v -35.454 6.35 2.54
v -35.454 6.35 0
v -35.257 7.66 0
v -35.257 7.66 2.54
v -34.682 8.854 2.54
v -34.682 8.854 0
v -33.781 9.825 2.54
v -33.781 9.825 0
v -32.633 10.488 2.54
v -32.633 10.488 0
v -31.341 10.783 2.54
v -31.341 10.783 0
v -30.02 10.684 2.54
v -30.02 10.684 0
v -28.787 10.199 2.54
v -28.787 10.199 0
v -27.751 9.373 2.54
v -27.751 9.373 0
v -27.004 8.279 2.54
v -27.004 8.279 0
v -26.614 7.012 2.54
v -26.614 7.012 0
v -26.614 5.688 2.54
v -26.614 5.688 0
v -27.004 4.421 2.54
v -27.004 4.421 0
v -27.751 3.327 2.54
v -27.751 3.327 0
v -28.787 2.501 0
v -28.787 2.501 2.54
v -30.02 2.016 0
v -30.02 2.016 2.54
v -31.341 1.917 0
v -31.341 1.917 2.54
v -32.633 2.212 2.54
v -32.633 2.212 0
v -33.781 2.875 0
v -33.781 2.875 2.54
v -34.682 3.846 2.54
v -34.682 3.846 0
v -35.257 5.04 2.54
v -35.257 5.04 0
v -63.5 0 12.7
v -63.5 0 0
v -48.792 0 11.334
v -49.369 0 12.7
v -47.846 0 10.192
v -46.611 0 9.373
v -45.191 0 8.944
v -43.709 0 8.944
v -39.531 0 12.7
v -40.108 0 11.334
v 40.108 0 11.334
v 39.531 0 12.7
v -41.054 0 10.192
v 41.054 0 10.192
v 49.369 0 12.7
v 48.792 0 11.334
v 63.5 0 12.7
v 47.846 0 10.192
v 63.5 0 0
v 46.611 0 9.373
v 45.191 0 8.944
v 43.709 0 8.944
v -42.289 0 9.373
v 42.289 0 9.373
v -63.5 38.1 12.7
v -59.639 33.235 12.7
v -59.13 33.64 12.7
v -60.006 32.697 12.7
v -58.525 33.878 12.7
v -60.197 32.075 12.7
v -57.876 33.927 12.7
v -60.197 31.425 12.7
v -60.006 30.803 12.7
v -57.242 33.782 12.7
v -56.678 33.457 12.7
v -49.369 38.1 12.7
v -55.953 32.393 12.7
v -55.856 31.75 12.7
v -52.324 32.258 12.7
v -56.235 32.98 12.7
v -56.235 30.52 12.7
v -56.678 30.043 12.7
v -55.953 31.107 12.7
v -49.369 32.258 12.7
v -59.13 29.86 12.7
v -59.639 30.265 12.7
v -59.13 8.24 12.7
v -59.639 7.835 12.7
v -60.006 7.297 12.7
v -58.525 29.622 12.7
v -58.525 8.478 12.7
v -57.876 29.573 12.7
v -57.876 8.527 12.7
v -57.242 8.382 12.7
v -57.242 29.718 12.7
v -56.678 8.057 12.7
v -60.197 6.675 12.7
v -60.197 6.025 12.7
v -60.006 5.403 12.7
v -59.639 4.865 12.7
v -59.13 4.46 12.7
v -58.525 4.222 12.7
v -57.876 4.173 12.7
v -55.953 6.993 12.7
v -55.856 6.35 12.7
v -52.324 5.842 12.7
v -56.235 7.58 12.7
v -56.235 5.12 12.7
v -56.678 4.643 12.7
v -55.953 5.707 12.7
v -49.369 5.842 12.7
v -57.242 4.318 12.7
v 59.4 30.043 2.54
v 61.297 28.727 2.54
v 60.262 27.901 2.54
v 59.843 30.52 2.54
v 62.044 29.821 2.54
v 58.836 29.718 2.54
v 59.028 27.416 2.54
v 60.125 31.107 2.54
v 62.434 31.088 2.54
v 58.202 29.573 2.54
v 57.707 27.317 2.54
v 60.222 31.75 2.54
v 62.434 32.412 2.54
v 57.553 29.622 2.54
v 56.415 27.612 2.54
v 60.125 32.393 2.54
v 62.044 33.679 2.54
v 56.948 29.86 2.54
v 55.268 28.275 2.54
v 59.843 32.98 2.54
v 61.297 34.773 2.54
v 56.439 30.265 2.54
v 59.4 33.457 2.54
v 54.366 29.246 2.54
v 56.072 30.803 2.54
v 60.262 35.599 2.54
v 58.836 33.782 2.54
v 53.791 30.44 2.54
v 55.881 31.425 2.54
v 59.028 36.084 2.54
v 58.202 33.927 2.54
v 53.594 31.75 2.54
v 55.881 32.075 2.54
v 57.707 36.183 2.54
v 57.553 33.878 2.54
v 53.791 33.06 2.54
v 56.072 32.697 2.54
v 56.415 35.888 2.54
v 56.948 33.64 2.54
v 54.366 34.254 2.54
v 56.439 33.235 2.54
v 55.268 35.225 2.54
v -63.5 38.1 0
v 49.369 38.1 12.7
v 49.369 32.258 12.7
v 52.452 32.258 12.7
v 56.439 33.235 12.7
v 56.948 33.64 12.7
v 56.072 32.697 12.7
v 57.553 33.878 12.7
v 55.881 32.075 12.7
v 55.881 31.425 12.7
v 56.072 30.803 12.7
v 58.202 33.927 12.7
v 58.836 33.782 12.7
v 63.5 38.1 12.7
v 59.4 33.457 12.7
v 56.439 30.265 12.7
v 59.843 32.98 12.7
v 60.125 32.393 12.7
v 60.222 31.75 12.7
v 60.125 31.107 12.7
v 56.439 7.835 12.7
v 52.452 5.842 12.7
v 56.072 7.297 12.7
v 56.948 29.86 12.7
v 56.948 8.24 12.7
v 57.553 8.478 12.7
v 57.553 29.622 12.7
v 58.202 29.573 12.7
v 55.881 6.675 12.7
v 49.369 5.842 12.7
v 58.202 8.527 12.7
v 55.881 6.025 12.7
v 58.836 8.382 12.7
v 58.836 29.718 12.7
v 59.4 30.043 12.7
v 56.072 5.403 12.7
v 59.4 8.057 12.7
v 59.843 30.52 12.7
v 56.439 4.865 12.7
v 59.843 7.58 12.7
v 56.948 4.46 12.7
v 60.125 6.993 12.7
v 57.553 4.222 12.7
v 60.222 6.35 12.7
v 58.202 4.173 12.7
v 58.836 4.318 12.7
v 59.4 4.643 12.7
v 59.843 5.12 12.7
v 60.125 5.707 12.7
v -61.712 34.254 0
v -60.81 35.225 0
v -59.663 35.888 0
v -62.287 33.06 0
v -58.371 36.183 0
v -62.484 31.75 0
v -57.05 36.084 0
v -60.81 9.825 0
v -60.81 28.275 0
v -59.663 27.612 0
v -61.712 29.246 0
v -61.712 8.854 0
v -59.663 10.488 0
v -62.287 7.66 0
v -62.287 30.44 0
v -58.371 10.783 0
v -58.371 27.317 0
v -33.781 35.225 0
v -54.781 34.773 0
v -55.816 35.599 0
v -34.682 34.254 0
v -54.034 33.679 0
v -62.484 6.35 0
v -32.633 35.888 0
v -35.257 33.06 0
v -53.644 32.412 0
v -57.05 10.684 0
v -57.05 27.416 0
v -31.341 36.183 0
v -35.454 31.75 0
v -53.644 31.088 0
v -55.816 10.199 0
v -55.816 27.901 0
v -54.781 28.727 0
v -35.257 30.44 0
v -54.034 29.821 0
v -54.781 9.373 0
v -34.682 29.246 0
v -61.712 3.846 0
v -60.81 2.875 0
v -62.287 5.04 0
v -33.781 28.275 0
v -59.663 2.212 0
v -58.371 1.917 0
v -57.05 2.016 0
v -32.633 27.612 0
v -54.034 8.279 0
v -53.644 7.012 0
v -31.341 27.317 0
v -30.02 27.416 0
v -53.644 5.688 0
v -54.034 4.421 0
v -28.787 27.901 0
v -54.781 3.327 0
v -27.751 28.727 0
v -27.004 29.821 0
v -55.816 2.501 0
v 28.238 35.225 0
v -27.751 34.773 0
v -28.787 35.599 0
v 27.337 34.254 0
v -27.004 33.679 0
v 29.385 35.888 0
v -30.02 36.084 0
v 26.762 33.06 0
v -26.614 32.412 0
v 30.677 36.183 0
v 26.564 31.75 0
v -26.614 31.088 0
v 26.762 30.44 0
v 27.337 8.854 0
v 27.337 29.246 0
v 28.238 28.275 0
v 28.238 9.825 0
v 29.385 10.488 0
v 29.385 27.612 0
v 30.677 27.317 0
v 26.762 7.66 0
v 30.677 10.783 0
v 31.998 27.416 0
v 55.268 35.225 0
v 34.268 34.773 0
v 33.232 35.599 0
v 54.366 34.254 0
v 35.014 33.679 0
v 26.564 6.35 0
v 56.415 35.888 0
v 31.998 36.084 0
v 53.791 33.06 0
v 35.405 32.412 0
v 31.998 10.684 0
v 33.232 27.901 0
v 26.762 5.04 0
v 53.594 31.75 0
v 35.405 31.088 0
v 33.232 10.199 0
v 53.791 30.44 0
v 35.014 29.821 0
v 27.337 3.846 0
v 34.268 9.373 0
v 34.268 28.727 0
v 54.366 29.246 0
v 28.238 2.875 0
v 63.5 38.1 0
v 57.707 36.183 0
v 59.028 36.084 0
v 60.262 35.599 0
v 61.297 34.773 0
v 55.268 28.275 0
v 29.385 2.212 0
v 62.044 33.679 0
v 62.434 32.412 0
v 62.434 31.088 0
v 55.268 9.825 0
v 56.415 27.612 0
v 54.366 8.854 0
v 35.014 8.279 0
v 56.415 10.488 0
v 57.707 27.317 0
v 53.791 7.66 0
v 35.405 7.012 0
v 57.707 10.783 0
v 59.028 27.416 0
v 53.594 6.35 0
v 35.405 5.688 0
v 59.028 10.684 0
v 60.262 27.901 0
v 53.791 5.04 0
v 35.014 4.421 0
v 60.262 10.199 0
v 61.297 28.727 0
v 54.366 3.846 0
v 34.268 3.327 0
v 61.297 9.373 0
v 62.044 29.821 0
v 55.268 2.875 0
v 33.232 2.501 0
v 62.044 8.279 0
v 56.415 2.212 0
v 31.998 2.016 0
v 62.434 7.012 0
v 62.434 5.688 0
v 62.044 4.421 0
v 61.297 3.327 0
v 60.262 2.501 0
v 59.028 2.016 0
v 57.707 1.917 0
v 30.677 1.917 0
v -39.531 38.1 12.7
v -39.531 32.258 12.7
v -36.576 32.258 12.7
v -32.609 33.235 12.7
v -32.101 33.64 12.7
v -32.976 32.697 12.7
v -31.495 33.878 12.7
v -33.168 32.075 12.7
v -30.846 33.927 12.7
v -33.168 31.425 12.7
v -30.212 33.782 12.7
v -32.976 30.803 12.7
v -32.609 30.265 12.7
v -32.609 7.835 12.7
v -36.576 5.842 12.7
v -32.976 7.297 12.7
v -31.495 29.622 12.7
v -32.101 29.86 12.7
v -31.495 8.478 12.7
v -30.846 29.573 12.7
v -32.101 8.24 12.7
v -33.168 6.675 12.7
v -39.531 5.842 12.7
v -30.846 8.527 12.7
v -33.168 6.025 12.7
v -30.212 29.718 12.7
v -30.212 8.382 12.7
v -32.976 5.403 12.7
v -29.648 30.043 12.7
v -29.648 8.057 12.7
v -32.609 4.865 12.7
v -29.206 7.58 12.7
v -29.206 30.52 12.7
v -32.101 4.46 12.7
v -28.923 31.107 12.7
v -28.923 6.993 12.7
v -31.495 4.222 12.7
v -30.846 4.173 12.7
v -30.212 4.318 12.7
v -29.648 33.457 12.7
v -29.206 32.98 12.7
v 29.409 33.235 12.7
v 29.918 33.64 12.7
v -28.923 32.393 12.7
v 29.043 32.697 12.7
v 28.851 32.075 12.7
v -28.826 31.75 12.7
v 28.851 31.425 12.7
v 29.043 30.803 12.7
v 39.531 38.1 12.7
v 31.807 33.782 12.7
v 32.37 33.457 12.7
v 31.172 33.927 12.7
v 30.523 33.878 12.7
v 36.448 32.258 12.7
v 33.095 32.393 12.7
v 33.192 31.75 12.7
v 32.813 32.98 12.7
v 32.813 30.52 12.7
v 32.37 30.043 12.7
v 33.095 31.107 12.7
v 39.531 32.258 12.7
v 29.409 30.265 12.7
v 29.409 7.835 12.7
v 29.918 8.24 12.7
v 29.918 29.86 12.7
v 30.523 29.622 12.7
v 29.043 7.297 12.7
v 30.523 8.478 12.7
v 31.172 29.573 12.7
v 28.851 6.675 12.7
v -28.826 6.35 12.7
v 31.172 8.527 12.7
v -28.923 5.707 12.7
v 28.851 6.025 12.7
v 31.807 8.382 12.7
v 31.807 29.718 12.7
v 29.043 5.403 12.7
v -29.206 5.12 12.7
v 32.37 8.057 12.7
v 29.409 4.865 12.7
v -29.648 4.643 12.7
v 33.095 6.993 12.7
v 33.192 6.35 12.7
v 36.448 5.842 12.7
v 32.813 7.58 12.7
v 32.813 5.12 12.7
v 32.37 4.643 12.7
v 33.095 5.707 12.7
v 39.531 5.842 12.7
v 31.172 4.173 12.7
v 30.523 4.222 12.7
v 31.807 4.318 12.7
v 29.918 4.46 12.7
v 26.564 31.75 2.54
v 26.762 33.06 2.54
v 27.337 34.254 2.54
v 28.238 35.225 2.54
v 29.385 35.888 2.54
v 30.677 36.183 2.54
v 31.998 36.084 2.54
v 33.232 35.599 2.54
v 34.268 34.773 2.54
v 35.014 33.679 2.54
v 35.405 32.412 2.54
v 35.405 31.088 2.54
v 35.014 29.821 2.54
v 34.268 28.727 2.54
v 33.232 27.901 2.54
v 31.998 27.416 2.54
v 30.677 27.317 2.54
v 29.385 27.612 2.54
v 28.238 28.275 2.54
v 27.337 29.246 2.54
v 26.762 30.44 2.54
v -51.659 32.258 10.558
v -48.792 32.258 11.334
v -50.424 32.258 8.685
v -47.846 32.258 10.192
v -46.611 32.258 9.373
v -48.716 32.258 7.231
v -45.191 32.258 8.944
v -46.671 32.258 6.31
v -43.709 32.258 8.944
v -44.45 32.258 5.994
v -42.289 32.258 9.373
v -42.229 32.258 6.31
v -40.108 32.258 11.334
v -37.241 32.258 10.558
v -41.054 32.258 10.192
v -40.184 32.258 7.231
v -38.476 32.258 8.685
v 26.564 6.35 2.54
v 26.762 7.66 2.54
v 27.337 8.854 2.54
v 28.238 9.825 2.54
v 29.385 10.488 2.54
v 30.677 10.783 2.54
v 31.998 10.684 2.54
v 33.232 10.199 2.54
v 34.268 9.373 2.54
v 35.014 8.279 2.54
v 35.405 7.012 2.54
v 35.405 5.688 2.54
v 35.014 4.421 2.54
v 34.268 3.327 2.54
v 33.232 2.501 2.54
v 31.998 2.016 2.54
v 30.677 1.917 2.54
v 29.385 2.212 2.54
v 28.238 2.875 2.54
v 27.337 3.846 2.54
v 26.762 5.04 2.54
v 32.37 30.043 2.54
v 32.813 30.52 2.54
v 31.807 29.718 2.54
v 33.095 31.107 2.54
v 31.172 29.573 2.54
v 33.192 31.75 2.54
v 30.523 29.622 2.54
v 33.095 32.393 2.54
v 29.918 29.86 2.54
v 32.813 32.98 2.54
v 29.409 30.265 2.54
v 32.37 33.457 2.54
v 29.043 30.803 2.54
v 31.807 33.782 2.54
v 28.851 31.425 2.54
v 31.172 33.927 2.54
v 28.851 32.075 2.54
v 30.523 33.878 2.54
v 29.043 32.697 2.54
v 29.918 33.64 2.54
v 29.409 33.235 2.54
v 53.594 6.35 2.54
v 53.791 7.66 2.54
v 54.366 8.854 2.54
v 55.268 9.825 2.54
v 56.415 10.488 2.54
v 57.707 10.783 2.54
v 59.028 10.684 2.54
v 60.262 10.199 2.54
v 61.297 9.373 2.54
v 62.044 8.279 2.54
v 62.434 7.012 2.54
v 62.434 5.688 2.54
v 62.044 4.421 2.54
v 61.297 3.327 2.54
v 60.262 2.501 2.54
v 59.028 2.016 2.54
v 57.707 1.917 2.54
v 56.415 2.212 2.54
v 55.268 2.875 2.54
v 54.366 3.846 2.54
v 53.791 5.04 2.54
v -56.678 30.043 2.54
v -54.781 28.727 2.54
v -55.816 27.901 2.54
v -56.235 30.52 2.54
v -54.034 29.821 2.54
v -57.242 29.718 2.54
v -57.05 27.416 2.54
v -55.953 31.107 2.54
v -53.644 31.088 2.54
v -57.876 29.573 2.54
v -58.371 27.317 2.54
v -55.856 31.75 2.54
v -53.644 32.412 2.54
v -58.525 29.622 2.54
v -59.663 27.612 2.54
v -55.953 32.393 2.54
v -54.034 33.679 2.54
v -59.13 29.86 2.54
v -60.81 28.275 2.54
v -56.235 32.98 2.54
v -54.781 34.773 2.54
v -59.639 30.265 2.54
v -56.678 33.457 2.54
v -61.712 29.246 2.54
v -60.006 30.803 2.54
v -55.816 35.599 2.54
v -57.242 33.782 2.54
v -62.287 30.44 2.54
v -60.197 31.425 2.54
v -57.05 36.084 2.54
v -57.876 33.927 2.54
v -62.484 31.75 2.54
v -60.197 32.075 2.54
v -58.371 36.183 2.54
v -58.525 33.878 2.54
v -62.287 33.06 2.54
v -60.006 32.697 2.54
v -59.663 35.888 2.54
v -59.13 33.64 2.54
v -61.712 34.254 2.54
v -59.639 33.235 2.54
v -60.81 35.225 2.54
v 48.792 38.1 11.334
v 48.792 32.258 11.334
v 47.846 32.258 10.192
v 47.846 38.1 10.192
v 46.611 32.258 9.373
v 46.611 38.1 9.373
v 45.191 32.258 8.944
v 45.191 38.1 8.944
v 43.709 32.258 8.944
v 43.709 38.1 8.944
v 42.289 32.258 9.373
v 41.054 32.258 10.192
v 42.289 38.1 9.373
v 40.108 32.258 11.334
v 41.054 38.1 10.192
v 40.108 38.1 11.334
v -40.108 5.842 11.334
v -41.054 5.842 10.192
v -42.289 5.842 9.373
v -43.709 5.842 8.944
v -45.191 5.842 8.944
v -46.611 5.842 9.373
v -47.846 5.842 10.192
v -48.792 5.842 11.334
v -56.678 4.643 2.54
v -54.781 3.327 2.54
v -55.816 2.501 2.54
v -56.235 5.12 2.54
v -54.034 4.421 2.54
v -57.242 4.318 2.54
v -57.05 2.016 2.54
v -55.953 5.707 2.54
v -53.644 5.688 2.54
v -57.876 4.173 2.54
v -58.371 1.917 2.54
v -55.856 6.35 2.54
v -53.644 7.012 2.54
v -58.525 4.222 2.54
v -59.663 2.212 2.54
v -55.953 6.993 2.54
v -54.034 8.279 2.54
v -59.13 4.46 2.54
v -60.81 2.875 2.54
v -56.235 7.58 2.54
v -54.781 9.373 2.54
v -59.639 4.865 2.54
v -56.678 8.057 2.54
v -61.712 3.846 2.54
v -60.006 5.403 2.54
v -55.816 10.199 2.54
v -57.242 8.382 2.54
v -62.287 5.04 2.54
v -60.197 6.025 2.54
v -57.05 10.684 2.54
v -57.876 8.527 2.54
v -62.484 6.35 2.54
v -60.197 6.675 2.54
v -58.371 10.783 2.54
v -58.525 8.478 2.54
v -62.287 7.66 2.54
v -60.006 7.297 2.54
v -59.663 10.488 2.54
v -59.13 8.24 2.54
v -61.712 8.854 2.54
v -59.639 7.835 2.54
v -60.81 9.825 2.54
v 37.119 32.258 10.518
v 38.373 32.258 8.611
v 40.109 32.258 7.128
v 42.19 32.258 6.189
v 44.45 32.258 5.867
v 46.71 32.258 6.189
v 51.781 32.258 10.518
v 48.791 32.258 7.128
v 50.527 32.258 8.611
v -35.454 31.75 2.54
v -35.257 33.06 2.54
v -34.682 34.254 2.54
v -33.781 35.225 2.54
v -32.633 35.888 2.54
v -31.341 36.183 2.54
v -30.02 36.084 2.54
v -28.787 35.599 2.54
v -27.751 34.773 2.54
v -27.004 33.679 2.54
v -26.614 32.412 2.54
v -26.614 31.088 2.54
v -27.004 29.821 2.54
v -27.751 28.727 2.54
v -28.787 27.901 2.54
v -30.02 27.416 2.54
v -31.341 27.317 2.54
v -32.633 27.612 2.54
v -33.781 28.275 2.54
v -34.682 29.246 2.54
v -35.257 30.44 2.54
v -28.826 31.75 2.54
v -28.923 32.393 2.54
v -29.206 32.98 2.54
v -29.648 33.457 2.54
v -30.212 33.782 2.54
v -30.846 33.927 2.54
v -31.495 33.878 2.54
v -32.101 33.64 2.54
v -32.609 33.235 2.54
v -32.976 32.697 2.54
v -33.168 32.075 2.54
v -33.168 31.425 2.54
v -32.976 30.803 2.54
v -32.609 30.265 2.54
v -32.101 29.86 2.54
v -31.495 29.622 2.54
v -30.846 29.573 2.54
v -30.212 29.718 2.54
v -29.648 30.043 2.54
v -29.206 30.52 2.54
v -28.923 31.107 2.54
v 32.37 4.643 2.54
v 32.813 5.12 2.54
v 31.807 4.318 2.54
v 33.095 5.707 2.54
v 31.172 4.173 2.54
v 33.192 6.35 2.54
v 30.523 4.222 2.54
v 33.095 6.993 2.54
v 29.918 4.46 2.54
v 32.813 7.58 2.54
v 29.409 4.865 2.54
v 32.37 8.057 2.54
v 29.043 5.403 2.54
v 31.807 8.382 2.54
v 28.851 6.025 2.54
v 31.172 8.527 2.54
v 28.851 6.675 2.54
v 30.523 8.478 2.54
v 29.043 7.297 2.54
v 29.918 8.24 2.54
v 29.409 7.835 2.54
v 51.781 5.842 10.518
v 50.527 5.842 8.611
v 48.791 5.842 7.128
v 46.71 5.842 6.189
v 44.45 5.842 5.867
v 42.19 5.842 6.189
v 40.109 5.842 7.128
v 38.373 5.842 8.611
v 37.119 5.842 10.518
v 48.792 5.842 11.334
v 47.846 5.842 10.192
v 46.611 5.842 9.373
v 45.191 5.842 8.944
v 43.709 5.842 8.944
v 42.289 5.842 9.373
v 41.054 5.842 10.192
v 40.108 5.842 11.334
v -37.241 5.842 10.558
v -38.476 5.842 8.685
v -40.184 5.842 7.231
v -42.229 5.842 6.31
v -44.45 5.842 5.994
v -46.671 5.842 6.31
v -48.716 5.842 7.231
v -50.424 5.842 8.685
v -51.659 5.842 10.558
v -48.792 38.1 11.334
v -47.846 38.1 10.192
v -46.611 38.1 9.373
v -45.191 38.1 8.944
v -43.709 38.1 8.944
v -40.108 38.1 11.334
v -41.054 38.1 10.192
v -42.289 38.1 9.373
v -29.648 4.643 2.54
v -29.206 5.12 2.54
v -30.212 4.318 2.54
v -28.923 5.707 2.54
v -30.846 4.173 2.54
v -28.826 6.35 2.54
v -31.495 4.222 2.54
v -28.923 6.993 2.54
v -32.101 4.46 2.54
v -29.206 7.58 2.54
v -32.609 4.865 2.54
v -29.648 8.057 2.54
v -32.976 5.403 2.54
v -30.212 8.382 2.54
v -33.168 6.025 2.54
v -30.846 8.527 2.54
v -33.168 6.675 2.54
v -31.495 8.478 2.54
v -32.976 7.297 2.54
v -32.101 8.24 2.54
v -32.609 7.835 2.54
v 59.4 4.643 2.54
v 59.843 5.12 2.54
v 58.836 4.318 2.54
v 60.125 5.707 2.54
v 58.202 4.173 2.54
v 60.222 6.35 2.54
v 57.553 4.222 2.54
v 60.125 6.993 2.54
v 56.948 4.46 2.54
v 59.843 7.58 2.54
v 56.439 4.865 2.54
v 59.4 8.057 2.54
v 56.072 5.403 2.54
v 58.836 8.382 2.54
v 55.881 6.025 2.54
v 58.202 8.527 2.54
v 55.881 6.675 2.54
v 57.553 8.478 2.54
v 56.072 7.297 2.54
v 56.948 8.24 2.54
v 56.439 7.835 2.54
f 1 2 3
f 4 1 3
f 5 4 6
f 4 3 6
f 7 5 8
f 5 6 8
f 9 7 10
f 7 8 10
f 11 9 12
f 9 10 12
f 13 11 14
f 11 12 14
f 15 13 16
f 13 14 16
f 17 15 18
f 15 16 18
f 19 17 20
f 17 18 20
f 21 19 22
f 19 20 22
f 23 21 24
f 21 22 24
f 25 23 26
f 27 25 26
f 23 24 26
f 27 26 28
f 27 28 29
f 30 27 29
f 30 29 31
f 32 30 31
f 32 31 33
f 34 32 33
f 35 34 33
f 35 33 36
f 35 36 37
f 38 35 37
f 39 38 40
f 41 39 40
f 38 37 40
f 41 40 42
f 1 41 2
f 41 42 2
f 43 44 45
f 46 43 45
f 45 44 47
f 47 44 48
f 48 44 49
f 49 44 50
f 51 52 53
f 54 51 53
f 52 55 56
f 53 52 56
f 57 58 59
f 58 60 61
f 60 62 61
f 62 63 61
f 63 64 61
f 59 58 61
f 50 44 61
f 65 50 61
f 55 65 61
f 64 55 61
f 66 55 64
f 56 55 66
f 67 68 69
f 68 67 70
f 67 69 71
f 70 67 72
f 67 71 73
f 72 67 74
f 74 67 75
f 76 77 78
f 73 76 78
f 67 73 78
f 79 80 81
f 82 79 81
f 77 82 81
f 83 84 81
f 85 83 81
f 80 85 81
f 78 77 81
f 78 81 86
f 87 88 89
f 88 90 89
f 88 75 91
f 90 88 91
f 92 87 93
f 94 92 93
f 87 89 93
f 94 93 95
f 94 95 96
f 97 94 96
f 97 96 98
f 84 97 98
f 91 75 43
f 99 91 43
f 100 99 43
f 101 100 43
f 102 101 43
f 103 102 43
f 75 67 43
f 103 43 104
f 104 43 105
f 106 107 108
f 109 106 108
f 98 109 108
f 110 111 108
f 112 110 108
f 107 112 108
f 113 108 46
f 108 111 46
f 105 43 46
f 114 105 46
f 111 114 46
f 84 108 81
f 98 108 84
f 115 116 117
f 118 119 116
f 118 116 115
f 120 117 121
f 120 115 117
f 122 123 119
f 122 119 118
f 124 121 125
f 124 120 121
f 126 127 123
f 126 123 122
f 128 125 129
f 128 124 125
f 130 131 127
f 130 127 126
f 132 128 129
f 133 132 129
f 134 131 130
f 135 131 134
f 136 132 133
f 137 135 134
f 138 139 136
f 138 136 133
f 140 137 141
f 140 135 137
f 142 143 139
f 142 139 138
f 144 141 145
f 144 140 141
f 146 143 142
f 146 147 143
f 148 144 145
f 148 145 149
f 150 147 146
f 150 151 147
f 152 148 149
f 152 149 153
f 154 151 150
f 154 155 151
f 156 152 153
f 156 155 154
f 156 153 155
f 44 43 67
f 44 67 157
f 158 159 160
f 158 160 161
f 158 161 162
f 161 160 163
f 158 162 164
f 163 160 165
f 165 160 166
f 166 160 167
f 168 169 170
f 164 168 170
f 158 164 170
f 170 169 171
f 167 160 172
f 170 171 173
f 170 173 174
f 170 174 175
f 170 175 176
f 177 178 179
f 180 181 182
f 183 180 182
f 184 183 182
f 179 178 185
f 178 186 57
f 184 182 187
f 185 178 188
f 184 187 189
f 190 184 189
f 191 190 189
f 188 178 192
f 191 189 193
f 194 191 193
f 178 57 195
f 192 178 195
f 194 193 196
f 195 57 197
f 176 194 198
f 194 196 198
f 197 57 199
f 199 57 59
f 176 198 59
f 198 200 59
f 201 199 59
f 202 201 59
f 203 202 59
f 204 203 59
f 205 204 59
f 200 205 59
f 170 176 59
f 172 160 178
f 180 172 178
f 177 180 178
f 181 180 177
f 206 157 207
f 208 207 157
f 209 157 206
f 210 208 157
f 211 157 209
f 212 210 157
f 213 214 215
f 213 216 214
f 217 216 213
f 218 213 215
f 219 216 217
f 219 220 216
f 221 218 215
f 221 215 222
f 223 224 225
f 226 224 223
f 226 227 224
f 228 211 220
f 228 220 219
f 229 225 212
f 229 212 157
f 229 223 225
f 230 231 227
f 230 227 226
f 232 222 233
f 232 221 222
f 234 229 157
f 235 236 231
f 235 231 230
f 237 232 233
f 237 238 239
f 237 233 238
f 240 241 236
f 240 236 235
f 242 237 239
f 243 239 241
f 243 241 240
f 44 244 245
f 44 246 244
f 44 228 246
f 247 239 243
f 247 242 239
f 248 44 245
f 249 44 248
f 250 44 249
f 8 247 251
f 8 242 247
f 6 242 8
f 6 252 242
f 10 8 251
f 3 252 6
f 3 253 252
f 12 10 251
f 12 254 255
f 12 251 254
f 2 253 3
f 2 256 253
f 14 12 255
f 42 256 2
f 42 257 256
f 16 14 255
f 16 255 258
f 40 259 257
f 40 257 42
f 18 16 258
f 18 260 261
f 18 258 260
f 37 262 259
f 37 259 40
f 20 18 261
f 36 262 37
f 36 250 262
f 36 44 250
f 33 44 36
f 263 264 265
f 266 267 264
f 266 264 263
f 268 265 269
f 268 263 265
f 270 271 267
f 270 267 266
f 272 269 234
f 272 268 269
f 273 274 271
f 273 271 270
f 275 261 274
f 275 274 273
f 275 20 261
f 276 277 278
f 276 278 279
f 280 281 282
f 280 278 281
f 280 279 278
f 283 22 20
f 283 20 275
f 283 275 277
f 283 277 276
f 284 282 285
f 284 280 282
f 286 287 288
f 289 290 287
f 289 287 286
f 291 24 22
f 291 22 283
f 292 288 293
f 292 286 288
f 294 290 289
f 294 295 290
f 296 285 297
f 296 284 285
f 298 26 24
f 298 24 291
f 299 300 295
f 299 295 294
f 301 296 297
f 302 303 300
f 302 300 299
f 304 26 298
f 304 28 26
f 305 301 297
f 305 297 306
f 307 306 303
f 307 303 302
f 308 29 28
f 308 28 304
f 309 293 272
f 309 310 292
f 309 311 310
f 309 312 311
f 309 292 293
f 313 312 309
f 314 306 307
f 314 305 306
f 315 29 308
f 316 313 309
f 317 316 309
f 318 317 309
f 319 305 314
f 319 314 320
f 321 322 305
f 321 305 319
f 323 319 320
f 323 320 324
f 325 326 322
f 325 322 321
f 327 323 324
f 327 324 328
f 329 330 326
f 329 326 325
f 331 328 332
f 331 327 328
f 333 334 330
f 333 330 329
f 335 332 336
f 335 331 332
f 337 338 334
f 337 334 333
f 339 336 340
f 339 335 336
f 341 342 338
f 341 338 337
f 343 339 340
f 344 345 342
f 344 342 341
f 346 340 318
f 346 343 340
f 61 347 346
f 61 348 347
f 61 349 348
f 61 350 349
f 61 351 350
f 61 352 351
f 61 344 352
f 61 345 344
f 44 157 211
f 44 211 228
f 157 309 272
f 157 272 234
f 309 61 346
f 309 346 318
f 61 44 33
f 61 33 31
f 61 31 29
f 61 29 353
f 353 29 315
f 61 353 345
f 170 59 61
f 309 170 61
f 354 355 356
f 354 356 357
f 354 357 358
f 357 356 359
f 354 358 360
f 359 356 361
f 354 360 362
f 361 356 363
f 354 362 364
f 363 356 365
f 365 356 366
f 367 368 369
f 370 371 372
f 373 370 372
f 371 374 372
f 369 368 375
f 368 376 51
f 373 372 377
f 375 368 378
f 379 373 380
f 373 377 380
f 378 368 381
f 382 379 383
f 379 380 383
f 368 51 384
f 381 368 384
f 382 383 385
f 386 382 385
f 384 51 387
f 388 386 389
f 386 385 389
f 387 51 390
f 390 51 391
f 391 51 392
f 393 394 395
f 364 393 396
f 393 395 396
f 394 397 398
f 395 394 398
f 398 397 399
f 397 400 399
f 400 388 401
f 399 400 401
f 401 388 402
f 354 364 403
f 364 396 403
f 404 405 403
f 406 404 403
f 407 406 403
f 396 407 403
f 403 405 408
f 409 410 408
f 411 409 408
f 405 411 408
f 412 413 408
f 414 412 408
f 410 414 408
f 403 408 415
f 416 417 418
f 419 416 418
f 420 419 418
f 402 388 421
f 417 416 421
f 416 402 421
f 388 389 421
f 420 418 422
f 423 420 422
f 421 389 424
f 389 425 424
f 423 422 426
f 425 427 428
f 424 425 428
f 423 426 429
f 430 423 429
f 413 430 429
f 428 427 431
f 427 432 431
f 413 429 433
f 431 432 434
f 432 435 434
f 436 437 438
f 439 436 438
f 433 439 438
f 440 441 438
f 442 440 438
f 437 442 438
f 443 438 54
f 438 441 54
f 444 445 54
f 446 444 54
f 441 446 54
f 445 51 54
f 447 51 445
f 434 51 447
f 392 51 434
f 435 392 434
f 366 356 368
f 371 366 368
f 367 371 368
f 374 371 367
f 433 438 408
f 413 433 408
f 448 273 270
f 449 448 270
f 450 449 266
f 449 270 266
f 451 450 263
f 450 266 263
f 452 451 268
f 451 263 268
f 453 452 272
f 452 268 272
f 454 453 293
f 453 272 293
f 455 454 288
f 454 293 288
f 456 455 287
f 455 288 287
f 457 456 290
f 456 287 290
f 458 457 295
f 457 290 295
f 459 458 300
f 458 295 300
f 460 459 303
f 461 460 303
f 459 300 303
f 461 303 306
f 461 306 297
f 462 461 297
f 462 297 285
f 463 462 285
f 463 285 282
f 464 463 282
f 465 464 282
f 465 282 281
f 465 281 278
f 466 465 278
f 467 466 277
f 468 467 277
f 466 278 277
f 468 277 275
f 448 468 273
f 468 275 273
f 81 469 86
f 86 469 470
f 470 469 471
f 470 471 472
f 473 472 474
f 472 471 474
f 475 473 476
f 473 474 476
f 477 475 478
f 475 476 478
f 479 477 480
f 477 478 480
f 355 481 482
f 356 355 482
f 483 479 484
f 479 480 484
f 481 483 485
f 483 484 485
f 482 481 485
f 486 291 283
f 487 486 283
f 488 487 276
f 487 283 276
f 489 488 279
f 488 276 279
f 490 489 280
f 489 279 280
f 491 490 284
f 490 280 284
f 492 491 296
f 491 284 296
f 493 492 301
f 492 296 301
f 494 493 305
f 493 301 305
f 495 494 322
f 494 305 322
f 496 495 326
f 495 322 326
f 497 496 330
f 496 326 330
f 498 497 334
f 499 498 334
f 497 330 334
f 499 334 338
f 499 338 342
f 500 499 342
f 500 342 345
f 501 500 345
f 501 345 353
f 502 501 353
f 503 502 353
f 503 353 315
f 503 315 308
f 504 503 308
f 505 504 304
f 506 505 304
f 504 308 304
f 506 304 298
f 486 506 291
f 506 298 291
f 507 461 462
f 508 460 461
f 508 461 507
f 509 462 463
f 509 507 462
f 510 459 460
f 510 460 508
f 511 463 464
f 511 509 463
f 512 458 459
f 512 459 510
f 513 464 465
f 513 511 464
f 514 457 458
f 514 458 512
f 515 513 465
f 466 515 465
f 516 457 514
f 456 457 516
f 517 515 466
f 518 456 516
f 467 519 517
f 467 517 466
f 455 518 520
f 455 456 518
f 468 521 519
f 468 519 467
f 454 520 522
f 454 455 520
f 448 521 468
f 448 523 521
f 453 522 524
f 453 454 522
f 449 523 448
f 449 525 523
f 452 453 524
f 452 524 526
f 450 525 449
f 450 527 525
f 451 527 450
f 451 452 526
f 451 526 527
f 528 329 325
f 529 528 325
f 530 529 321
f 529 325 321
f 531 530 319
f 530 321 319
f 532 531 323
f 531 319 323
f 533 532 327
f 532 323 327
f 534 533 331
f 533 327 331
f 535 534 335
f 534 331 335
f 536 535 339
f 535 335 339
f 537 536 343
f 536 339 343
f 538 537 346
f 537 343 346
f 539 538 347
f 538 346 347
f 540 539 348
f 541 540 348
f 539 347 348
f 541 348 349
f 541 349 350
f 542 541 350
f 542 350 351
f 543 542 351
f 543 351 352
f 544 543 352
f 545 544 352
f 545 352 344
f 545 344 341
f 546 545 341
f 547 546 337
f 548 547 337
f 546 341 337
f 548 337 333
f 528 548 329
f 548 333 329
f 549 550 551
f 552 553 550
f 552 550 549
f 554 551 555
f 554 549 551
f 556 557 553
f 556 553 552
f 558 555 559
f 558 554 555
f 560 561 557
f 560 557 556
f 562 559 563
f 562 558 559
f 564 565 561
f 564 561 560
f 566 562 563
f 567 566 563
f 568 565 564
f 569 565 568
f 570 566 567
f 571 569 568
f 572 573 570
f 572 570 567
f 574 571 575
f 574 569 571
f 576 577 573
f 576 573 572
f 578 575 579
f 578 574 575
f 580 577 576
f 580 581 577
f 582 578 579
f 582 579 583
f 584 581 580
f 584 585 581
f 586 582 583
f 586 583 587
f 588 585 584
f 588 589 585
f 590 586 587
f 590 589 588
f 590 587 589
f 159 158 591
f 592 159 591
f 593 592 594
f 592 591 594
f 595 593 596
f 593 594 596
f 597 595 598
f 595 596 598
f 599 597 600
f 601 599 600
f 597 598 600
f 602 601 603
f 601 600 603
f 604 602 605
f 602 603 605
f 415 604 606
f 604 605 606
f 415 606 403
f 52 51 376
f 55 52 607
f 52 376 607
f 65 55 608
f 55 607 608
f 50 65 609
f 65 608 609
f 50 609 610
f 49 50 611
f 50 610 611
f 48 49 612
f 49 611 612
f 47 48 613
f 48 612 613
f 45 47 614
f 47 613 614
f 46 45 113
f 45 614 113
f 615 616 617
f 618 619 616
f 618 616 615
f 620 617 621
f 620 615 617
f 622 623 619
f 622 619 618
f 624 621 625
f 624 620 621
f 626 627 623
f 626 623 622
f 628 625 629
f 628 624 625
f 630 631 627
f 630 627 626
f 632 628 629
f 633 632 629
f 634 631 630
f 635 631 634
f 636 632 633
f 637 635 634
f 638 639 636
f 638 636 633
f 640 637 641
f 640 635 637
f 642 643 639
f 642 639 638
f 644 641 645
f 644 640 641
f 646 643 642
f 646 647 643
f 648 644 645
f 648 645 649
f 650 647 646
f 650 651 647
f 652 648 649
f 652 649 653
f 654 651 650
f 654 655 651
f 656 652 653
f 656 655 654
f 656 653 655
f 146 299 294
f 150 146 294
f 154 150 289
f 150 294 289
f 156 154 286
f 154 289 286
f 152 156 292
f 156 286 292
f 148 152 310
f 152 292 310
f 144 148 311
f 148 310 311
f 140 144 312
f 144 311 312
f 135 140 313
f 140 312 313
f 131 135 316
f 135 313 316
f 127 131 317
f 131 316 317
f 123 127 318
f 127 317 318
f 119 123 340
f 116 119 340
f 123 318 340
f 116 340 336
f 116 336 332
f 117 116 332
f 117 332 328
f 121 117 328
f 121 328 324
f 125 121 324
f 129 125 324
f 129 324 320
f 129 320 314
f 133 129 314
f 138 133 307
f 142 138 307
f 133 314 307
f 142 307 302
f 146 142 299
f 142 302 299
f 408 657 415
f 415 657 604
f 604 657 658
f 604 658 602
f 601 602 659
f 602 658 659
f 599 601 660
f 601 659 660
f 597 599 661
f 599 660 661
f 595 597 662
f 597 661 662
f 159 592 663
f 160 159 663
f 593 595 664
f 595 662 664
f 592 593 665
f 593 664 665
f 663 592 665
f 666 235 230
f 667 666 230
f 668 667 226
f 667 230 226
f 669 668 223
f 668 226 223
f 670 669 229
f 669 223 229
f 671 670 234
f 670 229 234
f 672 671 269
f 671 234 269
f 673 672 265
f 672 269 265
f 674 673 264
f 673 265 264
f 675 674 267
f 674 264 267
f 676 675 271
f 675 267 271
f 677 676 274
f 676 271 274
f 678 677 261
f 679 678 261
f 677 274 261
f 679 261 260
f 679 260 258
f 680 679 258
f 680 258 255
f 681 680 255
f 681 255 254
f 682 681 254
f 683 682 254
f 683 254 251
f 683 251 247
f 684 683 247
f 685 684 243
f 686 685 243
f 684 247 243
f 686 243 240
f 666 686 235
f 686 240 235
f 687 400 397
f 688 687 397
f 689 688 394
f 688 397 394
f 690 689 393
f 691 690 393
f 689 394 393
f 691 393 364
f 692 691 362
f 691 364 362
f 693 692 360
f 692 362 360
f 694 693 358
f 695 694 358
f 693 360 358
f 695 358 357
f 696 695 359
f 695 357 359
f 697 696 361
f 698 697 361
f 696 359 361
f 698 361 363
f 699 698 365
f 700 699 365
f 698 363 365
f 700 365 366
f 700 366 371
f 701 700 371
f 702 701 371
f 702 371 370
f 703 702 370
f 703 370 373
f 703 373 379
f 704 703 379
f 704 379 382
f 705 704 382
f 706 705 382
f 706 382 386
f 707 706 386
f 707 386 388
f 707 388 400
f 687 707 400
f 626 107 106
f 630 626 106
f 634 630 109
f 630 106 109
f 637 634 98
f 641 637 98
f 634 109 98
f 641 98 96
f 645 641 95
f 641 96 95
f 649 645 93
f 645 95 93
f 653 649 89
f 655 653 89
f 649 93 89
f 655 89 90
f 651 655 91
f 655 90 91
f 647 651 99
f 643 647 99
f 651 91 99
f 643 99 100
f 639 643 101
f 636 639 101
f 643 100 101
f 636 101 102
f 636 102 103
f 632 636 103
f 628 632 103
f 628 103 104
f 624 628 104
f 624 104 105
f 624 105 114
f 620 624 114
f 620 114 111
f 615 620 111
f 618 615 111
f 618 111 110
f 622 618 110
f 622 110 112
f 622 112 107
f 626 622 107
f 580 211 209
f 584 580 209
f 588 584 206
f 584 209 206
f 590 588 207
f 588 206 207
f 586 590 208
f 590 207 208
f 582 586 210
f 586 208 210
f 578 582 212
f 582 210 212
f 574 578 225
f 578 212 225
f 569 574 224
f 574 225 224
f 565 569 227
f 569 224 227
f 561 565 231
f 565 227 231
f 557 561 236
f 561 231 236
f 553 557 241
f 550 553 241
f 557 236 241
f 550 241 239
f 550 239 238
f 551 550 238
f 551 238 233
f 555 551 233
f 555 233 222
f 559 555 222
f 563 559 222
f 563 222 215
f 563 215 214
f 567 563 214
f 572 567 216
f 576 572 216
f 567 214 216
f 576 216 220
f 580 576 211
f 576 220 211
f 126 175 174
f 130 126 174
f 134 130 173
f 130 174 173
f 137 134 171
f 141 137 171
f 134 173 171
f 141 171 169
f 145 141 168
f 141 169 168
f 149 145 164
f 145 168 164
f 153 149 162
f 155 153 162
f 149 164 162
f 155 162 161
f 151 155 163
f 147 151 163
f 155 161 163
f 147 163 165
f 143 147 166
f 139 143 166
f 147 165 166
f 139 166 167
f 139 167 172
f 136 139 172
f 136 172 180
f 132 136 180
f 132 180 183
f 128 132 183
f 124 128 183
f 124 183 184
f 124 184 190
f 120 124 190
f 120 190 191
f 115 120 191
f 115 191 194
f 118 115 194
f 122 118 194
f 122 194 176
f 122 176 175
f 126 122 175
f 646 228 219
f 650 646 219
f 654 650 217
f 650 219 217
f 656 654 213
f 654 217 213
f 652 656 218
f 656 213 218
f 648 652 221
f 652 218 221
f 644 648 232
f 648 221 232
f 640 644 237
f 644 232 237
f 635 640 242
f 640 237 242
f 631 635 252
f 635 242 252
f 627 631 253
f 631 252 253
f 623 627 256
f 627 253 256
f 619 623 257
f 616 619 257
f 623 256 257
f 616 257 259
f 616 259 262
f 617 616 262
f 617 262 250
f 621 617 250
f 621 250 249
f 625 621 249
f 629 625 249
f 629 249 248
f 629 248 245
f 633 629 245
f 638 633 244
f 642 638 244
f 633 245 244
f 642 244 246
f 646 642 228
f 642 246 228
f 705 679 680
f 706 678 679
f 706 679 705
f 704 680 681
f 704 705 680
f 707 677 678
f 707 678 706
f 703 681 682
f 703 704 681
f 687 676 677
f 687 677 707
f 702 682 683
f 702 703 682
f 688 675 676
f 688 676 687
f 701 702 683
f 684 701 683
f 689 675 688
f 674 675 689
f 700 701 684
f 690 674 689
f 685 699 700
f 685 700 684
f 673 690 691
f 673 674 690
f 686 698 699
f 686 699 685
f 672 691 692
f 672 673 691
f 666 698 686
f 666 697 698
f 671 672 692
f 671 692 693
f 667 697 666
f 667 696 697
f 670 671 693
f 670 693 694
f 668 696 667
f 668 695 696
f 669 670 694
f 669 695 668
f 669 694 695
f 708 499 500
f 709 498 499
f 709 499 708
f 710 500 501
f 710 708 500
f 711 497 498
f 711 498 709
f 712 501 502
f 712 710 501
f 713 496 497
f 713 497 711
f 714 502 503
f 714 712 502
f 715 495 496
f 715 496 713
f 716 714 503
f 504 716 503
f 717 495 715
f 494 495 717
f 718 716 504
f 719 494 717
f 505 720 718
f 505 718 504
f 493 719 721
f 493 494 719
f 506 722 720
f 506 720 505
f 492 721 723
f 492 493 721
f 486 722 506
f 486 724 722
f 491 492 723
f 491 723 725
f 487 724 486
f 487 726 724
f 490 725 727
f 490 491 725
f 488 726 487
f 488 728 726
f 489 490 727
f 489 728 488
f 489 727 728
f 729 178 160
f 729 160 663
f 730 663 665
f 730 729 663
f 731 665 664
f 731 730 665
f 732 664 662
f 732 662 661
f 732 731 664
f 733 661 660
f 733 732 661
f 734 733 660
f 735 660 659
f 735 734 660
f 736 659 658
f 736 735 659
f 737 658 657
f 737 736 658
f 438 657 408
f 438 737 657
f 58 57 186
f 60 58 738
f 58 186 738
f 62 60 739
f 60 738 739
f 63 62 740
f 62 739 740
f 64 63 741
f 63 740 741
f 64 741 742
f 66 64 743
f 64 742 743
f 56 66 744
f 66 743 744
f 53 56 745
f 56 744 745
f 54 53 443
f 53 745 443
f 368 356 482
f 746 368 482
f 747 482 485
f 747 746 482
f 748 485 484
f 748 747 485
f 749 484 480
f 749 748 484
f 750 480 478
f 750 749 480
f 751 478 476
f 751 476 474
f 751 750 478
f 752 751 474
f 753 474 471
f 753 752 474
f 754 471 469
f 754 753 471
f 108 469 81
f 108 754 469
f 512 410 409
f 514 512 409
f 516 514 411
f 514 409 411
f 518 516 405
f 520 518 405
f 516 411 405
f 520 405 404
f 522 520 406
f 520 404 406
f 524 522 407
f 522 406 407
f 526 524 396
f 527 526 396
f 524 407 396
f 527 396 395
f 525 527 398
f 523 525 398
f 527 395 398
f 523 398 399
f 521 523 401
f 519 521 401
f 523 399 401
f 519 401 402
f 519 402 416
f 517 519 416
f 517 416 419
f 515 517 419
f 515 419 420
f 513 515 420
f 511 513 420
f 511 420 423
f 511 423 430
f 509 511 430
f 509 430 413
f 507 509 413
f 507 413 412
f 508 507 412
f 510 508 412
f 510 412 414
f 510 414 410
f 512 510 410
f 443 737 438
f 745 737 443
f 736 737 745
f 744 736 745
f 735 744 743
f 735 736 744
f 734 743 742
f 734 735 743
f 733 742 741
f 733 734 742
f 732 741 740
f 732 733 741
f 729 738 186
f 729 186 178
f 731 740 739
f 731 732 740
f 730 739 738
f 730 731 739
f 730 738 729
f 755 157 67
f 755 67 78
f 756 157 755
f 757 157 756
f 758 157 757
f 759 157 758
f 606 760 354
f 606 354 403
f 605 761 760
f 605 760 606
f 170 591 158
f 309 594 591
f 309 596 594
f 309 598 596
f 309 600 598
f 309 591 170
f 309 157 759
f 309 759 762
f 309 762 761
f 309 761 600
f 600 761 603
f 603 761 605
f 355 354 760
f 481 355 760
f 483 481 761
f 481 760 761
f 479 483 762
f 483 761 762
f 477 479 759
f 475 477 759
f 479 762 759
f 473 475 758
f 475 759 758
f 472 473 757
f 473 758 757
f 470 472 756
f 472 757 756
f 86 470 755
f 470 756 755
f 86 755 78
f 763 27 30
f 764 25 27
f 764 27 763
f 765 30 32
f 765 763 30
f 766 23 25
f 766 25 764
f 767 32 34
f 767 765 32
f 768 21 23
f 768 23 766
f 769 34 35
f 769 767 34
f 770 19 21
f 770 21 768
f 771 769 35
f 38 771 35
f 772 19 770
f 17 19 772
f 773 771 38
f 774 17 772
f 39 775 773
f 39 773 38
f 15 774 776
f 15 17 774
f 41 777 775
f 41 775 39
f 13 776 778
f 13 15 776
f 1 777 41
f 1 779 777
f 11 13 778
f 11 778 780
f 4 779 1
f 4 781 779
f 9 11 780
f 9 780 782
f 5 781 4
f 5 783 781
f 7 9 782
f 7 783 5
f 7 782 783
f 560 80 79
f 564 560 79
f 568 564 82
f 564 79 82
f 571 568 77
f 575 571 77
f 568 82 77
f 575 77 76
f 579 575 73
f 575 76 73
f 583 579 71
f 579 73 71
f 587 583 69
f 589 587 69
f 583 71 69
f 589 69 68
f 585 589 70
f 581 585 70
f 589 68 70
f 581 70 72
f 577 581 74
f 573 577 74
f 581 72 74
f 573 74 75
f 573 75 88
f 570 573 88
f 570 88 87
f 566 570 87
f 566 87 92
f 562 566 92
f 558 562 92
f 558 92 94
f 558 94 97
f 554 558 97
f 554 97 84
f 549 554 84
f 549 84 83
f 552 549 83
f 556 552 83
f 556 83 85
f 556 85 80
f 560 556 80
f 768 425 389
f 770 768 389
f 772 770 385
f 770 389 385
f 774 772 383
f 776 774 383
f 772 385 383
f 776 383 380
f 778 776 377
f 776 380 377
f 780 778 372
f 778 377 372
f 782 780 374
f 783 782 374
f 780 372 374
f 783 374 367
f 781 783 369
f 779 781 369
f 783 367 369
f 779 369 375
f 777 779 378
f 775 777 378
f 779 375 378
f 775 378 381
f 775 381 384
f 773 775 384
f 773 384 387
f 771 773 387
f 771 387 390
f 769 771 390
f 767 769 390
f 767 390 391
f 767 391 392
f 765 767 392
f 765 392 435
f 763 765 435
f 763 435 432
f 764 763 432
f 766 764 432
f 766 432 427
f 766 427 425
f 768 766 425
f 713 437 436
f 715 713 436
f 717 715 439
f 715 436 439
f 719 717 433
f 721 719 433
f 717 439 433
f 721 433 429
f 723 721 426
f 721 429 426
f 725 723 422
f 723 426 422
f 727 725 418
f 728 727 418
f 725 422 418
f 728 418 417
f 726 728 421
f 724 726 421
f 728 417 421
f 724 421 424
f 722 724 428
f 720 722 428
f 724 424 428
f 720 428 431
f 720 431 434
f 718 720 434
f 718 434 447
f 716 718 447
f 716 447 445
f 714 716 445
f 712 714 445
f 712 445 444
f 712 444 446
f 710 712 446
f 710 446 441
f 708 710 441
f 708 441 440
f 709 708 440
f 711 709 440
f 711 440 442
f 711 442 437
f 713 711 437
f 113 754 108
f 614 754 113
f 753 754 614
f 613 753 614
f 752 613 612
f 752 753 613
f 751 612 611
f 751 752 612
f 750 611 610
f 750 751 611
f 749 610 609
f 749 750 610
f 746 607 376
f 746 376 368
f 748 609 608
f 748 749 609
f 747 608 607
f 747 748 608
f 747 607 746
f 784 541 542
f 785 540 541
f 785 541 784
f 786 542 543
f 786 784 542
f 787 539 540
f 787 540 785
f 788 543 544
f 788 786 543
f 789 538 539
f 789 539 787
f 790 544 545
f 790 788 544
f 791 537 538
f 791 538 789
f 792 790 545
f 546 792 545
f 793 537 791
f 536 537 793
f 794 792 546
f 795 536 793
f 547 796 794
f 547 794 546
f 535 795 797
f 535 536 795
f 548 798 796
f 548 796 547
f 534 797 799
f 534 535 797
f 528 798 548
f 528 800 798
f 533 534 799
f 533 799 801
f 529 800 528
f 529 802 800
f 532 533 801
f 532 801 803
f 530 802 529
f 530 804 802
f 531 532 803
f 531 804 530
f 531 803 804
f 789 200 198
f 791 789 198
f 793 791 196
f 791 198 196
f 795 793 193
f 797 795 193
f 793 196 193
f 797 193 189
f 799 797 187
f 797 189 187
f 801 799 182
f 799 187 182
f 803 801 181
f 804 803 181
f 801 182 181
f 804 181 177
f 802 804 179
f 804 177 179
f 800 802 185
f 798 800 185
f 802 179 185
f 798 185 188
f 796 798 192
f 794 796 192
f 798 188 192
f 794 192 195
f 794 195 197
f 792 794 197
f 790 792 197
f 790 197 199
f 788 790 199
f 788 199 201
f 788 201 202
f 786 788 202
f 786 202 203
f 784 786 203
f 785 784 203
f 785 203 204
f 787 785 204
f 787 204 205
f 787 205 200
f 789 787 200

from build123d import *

# Parameters (mm, degrees)
SKETCH1_W                                      = 127
SKETCH1_H                                      = 12.7
BOSS_EXTRUDE1_DEPTH                            = 38.1
SKETCH3_R                                      = 4.445
CUT_EXTRUDE3_DEPTH                             = 2.54
CUT_EXTRUDE4_DEPTH                             = 13.208
CUT_EXTRUDE4_DEPTH_BACK                        = 13.208
SKETCH2_R                                      = 7.9756
SKETCH2_R_2                                    = 8.1026
SKETCH6_R                                      = 5.08
CUT_EXTRUDE5_DEPTH                             = 38.1
F_11_64_0_17188_DIAMETER_HOLE1_D               = 4.365752
F_11_64_0_17188_DIAMETER_HOLE1_DEPTH           = 25.4
F_11_64_0_17188_DIAMETER_HOLE1_TIP             = 1.311604225
F_11_64_0_17188_DIAMETER_HOLE1_ON_FACE_2_D     = 4.365752
F_11_64_0_17188_DIAMETER_HOLE1_ON_FACE_2_DEPTH = 25.4
F_11_64_0_17188_DIAMETER_HOLE1_ON_FACE_2_TIP   = 1.311604225


with BuildPart() as part:
    # Sketch1 → Boss-Extrude1 (new body)
    with BuildSketch(Plane(origin=(0, 0, 0), x_dir=(1, 0, 0), z_dir=(0, 1, 0))):
        with Locations((0, -6.35)):
            Rectangle(SKETCH1_W, SKETCH1_H)
    extrude(amount=BOSS_EXTRUDE1_DEPTH)

    # Sketch3 → Cut-Extrude3 (cut)
    with BuildSketch(Plane(origin=(0, 0, 0), x_dir=(-1, 0, 0), z_dir=(0, 0, -1))):
        with Locations((-58.039, 31.75)):
            Circle(SKETCH3_R)
        with Locations((-58.039, 6.35)):
            Circle(SKETCH3_R)
        with Locations((-31.009232106, 31.75)):
            Circle(SKETCH3_R)
        with Locations((-31.009232106, 6.35)):
            Circle(SKETCH3_R)
        with Locations((31.009232106, 31.75)):
            Circle(SKETCH3_R)
        with Locations((31.009232106, 6.35)):
            Circle(SKETCH3_R)
        with Locations((58.039, 31.75)):
            Circle(SKETCH3_R)
        with Locations((58.039, 6.35)):
            Circle(SKETCH3_R)
    extrude(amount=-CUT_EXTRUDE3_DEPTH, mode=Mode.SUBTRACT)

    # Sketch2 → Cut-Extrude4 (cut, two sides: drawn at the far end of the back side and taken through both)
    with BuildSketch(Plane(origin=(0, 19.05, 0), x_dir=(1, 0, 0), z_dir=(0, 1, 0)).offset(-CUT_EXTRUDE4_DEPTH_BACK)):
        with Locations((-44.45, -13.97)):
            Circle(SKETCH2_R)
        with Locations((44.45, -13.97)):
            Circle(SKETCH2_R_2)
    extrude(amount=CUT_EXTRUDE4_DEPTH + CUT_EXTRUDE4_DEPTH_BACK, mode=Mode.SUBTRACT)

    # Sketch6 → Cut-Extrude5 (cut)
    with BuildSketch(Plane(origin=(0, 38.1, 0), x_dir=(1, 0, 0), z_dir=(0, 1, 0))):
        with Locations((-44.45, -13.97)):
            Circle(SKETCH6_R)
        with Locations((44.45, -13.97)):
            Circle(SKETCH6_R)
    extrude(amount=-CUT_EXTRUDE5_DEPTH, mode=Mode.SUBTRACT)

    # 11/64 (0.17188) Diameter Hole1
    with Locations(Plane(origin=(58.039, 31.75, 0), x_dir=(-1, 0, 0), z_dir=(0, 0, -1))):
        with Locations((0, 0), (27.029767894, 0), (27.029767894, -25.4), (89.048232106, -25.4), (116.078, 0)):
            Hole(F_11_64_0_17188_DIAMETER_HOLE1_D / 2, depth=F_11_64_0_17188_DIAMETER_HOLE1_DEPTH)
            with Locations((0, 0, -(F_11_64_0_17188_DIAMETER_HOLE1_DEPTH + F_11_64_0_17188_DIAMETER_HOLE1_TIP / 2))):  # 118° drill point
                Cone(0, F_11_64_0_17188_DIAMETER_HOLE1_D / 2, F_11_64_0_17188_DIAMETER_HOLE1_TIP, mode=Mode.SUBTRACT)

    # 11/64 (0.17188) Diameter Hole1 on face 2
    with Locations(Plane(origin=(58.039, 6.35, 2.54), x_dir=(-1, 0, 0), z_dir=(0, 0, -1))):
        with Locations((0, 0), (89.048232106, 25.4), (116.078, 0)):
            Hole(F_11_64_0_17188_DIAMETER_HOLE1_ON_FACE_2_D / 2, depth=F_11_64_0_17188_DIAMETER_HOLE1_ON_FACE_2_DEPTH)
            with Locations((0, 0, -(F_11_64_0_17188_DIAMETER_HOLE1_ON_FACE_2_DEPTH + F_11_64_0_17188_DIAMETER_HOLE1_ON_FACE_2_TIP / 2))):  # 118° drill point
                Cone(0, F_11_64_0_17188_DIAMETER_HOLE1_ON_FACE_2_D / 2, F_11_64_0_17188_DIAMETER_HOLE1_ON_FACE_2_TIP, mode=Mode.SUBTRACT)


solid = part.part
